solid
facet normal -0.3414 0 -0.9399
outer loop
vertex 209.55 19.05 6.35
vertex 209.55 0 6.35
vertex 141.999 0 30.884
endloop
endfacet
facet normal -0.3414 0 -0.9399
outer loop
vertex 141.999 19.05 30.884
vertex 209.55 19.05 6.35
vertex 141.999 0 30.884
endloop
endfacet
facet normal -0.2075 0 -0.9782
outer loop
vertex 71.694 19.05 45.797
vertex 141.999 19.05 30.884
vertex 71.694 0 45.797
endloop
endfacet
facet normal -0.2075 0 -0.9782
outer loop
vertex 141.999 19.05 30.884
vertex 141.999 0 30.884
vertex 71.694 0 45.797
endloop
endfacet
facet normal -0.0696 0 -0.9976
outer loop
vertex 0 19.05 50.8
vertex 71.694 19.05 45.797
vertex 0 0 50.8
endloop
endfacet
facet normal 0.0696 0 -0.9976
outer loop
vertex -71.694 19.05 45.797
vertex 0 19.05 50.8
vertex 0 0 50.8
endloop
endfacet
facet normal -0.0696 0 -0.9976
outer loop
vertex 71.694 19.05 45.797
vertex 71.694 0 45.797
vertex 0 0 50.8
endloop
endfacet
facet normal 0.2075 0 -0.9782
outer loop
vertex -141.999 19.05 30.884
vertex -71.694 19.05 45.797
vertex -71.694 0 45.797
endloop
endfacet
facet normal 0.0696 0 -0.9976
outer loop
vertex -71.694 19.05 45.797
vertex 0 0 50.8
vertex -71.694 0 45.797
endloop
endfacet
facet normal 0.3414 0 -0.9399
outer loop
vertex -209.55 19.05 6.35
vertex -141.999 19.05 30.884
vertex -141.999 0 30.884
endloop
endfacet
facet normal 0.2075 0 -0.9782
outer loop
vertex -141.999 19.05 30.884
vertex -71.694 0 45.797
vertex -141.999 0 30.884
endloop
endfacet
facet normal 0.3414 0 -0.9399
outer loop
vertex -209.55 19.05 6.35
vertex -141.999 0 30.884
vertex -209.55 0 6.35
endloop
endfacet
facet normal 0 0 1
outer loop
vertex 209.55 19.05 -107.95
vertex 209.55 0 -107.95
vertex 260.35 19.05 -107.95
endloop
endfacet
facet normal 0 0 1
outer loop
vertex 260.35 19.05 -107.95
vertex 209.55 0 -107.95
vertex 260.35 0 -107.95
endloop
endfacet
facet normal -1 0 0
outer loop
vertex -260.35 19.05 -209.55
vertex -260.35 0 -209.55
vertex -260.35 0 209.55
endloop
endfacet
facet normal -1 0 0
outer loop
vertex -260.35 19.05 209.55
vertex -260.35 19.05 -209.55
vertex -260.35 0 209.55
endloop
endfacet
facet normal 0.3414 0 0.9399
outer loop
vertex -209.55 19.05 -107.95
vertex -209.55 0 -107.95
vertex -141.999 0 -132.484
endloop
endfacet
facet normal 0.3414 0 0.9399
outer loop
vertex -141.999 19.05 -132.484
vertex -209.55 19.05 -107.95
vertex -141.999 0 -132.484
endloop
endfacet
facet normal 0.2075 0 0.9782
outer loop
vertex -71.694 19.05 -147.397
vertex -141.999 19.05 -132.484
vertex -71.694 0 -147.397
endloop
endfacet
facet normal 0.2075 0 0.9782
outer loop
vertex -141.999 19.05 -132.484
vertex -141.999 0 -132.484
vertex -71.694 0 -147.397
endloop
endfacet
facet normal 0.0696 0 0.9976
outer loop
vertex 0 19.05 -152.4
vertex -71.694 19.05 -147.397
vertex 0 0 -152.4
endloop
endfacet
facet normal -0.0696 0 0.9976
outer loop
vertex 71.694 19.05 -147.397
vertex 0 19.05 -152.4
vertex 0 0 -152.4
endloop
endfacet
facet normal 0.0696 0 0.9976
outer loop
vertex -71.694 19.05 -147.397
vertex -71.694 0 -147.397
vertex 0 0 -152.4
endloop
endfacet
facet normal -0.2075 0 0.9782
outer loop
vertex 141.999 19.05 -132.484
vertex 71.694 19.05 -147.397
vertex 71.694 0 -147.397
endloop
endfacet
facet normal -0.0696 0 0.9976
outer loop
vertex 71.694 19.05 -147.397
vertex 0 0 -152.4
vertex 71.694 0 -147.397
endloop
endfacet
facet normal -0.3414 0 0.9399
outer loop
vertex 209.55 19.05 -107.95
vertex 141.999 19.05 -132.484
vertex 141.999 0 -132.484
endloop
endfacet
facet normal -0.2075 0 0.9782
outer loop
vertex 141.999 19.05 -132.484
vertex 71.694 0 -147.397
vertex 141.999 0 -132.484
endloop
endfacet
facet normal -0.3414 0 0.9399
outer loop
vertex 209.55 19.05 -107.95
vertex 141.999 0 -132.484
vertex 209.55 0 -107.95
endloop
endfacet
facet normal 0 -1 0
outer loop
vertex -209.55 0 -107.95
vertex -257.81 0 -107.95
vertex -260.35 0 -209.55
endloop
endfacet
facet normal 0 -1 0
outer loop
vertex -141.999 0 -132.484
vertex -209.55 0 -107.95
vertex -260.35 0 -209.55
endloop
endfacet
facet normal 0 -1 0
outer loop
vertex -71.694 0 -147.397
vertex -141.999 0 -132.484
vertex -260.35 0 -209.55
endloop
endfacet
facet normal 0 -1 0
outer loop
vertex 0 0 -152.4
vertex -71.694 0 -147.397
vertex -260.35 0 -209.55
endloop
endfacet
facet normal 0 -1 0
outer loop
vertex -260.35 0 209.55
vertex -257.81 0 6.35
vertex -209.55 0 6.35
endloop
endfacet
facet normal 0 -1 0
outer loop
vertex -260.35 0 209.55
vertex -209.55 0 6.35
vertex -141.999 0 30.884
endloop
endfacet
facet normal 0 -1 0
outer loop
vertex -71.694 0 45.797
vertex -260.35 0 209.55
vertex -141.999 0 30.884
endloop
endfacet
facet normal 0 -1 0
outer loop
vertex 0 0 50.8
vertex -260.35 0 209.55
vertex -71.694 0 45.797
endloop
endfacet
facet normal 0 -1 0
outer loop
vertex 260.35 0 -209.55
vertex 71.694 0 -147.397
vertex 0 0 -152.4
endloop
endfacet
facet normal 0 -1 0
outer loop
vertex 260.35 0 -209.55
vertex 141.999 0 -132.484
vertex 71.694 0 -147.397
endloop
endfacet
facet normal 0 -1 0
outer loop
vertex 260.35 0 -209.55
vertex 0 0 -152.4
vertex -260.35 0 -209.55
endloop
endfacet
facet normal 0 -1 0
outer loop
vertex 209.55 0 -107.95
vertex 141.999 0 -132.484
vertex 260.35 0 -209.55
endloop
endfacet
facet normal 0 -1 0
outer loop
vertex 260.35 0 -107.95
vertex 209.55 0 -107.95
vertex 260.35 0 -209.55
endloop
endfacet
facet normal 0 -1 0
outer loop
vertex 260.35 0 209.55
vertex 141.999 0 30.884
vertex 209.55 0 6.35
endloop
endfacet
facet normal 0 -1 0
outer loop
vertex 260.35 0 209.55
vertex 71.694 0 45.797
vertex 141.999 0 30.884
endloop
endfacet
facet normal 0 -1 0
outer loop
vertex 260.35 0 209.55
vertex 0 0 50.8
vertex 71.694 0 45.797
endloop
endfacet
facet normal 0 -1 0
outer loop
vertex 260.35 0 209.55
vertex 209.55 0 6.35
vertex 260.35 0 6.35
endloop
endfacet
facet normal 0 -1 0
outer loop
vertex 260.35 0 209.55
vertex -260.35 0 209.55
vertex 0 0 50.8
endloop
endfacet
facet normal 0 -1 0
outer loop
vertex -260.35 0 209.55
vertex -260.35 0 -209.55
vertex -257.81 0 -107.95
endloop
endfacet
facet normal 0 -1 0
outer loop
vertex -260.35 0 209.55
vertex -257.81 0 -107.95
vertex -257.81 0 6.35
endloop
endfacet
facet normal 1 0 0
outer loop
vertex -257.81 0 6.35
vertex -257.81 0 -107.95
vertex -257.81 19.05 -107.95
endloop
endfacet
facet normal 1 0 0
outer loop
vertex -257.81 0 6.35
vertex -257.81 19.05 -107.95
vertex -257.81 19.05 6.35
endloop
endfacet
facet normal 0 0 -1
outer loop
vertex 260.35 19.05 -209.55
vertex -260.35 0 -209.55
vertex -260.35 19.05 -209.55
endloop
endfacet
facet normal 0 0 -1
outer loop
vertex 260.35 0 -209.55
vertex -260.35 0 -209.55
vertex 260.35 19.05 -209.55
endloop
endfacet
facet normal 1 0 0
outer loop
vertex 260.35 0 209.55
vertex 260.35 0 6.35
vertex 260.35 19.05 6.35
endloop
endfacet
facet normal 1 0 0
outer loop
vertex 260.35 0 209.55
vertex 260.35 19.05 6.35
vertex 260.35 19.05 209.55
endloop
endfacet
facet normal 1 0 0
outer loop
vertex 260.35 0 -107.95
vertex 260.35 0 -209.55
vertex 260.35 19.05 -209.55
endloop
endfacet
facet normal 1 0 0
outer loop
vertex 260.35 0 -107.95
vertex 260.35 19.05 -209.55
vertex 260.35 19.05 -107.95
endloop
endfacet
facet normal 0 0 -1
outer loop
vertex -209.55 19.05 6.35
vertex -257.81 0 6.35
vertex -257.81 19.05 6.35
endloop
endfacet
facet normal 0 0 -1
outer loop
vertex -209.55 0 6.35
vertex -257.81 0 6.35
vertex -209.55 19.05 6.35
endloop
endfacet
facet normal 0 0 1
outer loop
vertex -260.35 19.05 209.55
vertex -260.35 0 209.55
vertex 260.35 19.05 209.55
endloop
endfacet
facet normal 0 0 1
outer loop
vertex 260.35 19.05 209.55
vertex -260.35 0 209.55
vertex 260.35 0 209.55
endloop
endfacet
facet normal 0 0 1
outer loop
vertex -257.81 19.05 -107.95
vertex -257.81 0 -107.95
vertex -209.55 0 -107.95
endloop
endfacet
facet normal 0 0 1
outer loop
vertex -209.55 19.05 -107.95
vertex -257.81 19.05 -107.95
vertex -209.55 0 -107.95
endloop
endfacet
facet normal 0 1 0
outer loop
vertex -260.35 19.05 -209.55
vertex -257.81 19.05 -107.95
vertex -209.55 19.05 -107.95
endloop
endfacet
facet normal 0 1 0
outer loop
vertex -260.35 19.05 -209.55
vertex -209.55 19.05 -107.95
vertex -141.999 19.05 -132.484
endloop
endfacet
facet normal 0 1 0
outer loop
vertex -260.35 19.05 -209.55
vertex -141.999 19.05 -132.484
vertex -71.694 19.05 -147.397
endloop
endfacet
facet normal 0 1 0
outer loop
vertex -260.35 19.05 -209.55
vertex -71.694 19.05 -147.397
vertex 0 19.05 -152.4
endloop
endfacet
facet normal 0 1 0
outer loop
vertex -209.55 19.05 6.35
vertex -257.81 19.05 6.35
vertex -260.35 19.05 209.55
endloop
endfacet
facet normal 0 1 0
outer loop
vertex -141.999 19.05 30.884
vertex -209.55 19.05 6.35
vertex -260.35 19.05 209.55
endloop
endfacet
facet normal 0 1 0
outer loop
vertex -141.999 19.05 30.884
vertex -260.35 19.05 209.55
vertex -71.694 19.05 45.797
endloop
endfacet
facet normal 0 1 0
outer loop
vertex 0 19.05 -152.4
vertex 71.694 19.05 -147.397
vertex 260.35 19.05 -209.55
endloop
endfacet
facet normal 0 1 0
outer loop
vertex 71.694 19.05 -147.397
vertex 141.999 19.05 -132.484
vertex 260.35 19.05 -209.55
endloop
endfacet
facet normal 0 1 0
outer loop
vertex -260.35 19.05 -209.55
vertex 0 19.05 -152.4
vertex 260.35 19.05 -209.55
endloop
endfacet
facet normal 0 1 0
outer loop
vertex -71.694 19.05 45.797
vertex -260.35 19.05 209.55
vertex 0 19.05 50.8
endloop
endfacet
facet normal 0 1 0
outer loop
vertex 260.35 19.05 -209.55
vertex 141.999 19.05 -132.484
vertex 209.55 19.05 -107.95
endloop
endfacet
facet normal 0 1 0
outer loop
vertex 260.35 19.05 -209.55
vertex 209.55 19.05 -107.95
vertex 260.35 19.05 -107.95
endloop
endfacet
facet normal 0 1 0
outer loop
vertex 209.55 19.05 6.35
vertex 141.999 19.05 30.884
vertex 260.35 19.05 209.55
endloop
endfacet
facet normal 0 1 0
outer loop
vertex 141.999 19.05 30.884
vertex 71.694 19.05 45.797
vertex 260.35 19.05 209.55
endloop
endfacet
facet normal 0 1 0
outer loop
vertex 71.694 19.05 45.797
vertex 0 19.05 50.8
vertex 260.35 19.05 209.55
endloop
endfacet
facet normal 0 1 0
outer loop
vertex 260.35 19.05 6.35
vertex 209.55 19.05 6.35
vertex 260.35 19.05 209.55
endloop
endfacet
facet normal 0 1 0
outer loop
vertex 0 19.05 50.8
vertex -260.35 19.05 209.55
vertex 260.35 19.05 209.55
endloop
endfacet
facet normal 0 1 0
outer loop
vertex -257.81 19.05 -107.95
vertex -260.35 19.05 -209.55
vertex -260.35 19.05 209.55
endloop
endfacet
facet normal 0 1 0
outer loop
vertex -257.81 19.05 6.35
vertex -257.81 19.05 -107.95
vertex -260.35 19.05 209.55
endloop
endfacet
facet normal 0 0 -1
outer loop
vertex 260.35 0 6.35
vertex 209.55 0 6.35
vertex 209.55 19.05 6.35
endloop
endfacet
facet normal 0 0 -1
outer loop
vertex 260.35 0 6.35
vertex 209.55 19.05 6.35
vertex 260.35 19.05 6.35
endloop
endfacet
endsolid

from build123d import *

# Parameters (mm, degrees)
F0_W     = 520.7
F0_H     = 419.1
F1_DEPTH = 19.05
F3_W     = 520.7
F3_H     = 114.3
F4_DEPTH = 25.4
F6_DEPTH = 25.4
F7_W     = 2.54
F7_H     = 243.400686
F8_DEPTH = 19.05


with BuildPart() as f1:
    # F0 (on Front) → F1 (new body)
    with BuildSketch(Plane.XZ):
        Rectangle(F0_W, F0_H)
    extrude(amount=-F1_DEPTH)

    # F3 (on face) → F4 (cut)
    with BuildSketch(Plane.XZ):
        with Locations((0, -50.8)):
            Rectangle(F3_W, F3_H)
    extrude(amount=-F4_DEPTH, mode=Mode.SUBTRACT)

    # F5 (on face) → F6 (cut)
    with BuildSketch(Plane.XZ):
        with BuildLine():
            ThreePointArc((-307.509387, -50.8), (0, -152.4), (307.509387, -50.8))
            ThreePointArc((307.509387, -50.8), (0, 50.8), (-307.509387, -50.8))
        make_face()
    extrude(amount=-F6_DEPTH, mode=Mode.SUBTRACT)

    # F7 (on face) → F8 (join, through all)
    with BuildSketch(Plane.XZ):
        with Locations((-259.08, -28.190974)):
            Rectangle(F7_W, F7_H)
    extrude(amount=-F8_DEPTH)


solid = f1.part
